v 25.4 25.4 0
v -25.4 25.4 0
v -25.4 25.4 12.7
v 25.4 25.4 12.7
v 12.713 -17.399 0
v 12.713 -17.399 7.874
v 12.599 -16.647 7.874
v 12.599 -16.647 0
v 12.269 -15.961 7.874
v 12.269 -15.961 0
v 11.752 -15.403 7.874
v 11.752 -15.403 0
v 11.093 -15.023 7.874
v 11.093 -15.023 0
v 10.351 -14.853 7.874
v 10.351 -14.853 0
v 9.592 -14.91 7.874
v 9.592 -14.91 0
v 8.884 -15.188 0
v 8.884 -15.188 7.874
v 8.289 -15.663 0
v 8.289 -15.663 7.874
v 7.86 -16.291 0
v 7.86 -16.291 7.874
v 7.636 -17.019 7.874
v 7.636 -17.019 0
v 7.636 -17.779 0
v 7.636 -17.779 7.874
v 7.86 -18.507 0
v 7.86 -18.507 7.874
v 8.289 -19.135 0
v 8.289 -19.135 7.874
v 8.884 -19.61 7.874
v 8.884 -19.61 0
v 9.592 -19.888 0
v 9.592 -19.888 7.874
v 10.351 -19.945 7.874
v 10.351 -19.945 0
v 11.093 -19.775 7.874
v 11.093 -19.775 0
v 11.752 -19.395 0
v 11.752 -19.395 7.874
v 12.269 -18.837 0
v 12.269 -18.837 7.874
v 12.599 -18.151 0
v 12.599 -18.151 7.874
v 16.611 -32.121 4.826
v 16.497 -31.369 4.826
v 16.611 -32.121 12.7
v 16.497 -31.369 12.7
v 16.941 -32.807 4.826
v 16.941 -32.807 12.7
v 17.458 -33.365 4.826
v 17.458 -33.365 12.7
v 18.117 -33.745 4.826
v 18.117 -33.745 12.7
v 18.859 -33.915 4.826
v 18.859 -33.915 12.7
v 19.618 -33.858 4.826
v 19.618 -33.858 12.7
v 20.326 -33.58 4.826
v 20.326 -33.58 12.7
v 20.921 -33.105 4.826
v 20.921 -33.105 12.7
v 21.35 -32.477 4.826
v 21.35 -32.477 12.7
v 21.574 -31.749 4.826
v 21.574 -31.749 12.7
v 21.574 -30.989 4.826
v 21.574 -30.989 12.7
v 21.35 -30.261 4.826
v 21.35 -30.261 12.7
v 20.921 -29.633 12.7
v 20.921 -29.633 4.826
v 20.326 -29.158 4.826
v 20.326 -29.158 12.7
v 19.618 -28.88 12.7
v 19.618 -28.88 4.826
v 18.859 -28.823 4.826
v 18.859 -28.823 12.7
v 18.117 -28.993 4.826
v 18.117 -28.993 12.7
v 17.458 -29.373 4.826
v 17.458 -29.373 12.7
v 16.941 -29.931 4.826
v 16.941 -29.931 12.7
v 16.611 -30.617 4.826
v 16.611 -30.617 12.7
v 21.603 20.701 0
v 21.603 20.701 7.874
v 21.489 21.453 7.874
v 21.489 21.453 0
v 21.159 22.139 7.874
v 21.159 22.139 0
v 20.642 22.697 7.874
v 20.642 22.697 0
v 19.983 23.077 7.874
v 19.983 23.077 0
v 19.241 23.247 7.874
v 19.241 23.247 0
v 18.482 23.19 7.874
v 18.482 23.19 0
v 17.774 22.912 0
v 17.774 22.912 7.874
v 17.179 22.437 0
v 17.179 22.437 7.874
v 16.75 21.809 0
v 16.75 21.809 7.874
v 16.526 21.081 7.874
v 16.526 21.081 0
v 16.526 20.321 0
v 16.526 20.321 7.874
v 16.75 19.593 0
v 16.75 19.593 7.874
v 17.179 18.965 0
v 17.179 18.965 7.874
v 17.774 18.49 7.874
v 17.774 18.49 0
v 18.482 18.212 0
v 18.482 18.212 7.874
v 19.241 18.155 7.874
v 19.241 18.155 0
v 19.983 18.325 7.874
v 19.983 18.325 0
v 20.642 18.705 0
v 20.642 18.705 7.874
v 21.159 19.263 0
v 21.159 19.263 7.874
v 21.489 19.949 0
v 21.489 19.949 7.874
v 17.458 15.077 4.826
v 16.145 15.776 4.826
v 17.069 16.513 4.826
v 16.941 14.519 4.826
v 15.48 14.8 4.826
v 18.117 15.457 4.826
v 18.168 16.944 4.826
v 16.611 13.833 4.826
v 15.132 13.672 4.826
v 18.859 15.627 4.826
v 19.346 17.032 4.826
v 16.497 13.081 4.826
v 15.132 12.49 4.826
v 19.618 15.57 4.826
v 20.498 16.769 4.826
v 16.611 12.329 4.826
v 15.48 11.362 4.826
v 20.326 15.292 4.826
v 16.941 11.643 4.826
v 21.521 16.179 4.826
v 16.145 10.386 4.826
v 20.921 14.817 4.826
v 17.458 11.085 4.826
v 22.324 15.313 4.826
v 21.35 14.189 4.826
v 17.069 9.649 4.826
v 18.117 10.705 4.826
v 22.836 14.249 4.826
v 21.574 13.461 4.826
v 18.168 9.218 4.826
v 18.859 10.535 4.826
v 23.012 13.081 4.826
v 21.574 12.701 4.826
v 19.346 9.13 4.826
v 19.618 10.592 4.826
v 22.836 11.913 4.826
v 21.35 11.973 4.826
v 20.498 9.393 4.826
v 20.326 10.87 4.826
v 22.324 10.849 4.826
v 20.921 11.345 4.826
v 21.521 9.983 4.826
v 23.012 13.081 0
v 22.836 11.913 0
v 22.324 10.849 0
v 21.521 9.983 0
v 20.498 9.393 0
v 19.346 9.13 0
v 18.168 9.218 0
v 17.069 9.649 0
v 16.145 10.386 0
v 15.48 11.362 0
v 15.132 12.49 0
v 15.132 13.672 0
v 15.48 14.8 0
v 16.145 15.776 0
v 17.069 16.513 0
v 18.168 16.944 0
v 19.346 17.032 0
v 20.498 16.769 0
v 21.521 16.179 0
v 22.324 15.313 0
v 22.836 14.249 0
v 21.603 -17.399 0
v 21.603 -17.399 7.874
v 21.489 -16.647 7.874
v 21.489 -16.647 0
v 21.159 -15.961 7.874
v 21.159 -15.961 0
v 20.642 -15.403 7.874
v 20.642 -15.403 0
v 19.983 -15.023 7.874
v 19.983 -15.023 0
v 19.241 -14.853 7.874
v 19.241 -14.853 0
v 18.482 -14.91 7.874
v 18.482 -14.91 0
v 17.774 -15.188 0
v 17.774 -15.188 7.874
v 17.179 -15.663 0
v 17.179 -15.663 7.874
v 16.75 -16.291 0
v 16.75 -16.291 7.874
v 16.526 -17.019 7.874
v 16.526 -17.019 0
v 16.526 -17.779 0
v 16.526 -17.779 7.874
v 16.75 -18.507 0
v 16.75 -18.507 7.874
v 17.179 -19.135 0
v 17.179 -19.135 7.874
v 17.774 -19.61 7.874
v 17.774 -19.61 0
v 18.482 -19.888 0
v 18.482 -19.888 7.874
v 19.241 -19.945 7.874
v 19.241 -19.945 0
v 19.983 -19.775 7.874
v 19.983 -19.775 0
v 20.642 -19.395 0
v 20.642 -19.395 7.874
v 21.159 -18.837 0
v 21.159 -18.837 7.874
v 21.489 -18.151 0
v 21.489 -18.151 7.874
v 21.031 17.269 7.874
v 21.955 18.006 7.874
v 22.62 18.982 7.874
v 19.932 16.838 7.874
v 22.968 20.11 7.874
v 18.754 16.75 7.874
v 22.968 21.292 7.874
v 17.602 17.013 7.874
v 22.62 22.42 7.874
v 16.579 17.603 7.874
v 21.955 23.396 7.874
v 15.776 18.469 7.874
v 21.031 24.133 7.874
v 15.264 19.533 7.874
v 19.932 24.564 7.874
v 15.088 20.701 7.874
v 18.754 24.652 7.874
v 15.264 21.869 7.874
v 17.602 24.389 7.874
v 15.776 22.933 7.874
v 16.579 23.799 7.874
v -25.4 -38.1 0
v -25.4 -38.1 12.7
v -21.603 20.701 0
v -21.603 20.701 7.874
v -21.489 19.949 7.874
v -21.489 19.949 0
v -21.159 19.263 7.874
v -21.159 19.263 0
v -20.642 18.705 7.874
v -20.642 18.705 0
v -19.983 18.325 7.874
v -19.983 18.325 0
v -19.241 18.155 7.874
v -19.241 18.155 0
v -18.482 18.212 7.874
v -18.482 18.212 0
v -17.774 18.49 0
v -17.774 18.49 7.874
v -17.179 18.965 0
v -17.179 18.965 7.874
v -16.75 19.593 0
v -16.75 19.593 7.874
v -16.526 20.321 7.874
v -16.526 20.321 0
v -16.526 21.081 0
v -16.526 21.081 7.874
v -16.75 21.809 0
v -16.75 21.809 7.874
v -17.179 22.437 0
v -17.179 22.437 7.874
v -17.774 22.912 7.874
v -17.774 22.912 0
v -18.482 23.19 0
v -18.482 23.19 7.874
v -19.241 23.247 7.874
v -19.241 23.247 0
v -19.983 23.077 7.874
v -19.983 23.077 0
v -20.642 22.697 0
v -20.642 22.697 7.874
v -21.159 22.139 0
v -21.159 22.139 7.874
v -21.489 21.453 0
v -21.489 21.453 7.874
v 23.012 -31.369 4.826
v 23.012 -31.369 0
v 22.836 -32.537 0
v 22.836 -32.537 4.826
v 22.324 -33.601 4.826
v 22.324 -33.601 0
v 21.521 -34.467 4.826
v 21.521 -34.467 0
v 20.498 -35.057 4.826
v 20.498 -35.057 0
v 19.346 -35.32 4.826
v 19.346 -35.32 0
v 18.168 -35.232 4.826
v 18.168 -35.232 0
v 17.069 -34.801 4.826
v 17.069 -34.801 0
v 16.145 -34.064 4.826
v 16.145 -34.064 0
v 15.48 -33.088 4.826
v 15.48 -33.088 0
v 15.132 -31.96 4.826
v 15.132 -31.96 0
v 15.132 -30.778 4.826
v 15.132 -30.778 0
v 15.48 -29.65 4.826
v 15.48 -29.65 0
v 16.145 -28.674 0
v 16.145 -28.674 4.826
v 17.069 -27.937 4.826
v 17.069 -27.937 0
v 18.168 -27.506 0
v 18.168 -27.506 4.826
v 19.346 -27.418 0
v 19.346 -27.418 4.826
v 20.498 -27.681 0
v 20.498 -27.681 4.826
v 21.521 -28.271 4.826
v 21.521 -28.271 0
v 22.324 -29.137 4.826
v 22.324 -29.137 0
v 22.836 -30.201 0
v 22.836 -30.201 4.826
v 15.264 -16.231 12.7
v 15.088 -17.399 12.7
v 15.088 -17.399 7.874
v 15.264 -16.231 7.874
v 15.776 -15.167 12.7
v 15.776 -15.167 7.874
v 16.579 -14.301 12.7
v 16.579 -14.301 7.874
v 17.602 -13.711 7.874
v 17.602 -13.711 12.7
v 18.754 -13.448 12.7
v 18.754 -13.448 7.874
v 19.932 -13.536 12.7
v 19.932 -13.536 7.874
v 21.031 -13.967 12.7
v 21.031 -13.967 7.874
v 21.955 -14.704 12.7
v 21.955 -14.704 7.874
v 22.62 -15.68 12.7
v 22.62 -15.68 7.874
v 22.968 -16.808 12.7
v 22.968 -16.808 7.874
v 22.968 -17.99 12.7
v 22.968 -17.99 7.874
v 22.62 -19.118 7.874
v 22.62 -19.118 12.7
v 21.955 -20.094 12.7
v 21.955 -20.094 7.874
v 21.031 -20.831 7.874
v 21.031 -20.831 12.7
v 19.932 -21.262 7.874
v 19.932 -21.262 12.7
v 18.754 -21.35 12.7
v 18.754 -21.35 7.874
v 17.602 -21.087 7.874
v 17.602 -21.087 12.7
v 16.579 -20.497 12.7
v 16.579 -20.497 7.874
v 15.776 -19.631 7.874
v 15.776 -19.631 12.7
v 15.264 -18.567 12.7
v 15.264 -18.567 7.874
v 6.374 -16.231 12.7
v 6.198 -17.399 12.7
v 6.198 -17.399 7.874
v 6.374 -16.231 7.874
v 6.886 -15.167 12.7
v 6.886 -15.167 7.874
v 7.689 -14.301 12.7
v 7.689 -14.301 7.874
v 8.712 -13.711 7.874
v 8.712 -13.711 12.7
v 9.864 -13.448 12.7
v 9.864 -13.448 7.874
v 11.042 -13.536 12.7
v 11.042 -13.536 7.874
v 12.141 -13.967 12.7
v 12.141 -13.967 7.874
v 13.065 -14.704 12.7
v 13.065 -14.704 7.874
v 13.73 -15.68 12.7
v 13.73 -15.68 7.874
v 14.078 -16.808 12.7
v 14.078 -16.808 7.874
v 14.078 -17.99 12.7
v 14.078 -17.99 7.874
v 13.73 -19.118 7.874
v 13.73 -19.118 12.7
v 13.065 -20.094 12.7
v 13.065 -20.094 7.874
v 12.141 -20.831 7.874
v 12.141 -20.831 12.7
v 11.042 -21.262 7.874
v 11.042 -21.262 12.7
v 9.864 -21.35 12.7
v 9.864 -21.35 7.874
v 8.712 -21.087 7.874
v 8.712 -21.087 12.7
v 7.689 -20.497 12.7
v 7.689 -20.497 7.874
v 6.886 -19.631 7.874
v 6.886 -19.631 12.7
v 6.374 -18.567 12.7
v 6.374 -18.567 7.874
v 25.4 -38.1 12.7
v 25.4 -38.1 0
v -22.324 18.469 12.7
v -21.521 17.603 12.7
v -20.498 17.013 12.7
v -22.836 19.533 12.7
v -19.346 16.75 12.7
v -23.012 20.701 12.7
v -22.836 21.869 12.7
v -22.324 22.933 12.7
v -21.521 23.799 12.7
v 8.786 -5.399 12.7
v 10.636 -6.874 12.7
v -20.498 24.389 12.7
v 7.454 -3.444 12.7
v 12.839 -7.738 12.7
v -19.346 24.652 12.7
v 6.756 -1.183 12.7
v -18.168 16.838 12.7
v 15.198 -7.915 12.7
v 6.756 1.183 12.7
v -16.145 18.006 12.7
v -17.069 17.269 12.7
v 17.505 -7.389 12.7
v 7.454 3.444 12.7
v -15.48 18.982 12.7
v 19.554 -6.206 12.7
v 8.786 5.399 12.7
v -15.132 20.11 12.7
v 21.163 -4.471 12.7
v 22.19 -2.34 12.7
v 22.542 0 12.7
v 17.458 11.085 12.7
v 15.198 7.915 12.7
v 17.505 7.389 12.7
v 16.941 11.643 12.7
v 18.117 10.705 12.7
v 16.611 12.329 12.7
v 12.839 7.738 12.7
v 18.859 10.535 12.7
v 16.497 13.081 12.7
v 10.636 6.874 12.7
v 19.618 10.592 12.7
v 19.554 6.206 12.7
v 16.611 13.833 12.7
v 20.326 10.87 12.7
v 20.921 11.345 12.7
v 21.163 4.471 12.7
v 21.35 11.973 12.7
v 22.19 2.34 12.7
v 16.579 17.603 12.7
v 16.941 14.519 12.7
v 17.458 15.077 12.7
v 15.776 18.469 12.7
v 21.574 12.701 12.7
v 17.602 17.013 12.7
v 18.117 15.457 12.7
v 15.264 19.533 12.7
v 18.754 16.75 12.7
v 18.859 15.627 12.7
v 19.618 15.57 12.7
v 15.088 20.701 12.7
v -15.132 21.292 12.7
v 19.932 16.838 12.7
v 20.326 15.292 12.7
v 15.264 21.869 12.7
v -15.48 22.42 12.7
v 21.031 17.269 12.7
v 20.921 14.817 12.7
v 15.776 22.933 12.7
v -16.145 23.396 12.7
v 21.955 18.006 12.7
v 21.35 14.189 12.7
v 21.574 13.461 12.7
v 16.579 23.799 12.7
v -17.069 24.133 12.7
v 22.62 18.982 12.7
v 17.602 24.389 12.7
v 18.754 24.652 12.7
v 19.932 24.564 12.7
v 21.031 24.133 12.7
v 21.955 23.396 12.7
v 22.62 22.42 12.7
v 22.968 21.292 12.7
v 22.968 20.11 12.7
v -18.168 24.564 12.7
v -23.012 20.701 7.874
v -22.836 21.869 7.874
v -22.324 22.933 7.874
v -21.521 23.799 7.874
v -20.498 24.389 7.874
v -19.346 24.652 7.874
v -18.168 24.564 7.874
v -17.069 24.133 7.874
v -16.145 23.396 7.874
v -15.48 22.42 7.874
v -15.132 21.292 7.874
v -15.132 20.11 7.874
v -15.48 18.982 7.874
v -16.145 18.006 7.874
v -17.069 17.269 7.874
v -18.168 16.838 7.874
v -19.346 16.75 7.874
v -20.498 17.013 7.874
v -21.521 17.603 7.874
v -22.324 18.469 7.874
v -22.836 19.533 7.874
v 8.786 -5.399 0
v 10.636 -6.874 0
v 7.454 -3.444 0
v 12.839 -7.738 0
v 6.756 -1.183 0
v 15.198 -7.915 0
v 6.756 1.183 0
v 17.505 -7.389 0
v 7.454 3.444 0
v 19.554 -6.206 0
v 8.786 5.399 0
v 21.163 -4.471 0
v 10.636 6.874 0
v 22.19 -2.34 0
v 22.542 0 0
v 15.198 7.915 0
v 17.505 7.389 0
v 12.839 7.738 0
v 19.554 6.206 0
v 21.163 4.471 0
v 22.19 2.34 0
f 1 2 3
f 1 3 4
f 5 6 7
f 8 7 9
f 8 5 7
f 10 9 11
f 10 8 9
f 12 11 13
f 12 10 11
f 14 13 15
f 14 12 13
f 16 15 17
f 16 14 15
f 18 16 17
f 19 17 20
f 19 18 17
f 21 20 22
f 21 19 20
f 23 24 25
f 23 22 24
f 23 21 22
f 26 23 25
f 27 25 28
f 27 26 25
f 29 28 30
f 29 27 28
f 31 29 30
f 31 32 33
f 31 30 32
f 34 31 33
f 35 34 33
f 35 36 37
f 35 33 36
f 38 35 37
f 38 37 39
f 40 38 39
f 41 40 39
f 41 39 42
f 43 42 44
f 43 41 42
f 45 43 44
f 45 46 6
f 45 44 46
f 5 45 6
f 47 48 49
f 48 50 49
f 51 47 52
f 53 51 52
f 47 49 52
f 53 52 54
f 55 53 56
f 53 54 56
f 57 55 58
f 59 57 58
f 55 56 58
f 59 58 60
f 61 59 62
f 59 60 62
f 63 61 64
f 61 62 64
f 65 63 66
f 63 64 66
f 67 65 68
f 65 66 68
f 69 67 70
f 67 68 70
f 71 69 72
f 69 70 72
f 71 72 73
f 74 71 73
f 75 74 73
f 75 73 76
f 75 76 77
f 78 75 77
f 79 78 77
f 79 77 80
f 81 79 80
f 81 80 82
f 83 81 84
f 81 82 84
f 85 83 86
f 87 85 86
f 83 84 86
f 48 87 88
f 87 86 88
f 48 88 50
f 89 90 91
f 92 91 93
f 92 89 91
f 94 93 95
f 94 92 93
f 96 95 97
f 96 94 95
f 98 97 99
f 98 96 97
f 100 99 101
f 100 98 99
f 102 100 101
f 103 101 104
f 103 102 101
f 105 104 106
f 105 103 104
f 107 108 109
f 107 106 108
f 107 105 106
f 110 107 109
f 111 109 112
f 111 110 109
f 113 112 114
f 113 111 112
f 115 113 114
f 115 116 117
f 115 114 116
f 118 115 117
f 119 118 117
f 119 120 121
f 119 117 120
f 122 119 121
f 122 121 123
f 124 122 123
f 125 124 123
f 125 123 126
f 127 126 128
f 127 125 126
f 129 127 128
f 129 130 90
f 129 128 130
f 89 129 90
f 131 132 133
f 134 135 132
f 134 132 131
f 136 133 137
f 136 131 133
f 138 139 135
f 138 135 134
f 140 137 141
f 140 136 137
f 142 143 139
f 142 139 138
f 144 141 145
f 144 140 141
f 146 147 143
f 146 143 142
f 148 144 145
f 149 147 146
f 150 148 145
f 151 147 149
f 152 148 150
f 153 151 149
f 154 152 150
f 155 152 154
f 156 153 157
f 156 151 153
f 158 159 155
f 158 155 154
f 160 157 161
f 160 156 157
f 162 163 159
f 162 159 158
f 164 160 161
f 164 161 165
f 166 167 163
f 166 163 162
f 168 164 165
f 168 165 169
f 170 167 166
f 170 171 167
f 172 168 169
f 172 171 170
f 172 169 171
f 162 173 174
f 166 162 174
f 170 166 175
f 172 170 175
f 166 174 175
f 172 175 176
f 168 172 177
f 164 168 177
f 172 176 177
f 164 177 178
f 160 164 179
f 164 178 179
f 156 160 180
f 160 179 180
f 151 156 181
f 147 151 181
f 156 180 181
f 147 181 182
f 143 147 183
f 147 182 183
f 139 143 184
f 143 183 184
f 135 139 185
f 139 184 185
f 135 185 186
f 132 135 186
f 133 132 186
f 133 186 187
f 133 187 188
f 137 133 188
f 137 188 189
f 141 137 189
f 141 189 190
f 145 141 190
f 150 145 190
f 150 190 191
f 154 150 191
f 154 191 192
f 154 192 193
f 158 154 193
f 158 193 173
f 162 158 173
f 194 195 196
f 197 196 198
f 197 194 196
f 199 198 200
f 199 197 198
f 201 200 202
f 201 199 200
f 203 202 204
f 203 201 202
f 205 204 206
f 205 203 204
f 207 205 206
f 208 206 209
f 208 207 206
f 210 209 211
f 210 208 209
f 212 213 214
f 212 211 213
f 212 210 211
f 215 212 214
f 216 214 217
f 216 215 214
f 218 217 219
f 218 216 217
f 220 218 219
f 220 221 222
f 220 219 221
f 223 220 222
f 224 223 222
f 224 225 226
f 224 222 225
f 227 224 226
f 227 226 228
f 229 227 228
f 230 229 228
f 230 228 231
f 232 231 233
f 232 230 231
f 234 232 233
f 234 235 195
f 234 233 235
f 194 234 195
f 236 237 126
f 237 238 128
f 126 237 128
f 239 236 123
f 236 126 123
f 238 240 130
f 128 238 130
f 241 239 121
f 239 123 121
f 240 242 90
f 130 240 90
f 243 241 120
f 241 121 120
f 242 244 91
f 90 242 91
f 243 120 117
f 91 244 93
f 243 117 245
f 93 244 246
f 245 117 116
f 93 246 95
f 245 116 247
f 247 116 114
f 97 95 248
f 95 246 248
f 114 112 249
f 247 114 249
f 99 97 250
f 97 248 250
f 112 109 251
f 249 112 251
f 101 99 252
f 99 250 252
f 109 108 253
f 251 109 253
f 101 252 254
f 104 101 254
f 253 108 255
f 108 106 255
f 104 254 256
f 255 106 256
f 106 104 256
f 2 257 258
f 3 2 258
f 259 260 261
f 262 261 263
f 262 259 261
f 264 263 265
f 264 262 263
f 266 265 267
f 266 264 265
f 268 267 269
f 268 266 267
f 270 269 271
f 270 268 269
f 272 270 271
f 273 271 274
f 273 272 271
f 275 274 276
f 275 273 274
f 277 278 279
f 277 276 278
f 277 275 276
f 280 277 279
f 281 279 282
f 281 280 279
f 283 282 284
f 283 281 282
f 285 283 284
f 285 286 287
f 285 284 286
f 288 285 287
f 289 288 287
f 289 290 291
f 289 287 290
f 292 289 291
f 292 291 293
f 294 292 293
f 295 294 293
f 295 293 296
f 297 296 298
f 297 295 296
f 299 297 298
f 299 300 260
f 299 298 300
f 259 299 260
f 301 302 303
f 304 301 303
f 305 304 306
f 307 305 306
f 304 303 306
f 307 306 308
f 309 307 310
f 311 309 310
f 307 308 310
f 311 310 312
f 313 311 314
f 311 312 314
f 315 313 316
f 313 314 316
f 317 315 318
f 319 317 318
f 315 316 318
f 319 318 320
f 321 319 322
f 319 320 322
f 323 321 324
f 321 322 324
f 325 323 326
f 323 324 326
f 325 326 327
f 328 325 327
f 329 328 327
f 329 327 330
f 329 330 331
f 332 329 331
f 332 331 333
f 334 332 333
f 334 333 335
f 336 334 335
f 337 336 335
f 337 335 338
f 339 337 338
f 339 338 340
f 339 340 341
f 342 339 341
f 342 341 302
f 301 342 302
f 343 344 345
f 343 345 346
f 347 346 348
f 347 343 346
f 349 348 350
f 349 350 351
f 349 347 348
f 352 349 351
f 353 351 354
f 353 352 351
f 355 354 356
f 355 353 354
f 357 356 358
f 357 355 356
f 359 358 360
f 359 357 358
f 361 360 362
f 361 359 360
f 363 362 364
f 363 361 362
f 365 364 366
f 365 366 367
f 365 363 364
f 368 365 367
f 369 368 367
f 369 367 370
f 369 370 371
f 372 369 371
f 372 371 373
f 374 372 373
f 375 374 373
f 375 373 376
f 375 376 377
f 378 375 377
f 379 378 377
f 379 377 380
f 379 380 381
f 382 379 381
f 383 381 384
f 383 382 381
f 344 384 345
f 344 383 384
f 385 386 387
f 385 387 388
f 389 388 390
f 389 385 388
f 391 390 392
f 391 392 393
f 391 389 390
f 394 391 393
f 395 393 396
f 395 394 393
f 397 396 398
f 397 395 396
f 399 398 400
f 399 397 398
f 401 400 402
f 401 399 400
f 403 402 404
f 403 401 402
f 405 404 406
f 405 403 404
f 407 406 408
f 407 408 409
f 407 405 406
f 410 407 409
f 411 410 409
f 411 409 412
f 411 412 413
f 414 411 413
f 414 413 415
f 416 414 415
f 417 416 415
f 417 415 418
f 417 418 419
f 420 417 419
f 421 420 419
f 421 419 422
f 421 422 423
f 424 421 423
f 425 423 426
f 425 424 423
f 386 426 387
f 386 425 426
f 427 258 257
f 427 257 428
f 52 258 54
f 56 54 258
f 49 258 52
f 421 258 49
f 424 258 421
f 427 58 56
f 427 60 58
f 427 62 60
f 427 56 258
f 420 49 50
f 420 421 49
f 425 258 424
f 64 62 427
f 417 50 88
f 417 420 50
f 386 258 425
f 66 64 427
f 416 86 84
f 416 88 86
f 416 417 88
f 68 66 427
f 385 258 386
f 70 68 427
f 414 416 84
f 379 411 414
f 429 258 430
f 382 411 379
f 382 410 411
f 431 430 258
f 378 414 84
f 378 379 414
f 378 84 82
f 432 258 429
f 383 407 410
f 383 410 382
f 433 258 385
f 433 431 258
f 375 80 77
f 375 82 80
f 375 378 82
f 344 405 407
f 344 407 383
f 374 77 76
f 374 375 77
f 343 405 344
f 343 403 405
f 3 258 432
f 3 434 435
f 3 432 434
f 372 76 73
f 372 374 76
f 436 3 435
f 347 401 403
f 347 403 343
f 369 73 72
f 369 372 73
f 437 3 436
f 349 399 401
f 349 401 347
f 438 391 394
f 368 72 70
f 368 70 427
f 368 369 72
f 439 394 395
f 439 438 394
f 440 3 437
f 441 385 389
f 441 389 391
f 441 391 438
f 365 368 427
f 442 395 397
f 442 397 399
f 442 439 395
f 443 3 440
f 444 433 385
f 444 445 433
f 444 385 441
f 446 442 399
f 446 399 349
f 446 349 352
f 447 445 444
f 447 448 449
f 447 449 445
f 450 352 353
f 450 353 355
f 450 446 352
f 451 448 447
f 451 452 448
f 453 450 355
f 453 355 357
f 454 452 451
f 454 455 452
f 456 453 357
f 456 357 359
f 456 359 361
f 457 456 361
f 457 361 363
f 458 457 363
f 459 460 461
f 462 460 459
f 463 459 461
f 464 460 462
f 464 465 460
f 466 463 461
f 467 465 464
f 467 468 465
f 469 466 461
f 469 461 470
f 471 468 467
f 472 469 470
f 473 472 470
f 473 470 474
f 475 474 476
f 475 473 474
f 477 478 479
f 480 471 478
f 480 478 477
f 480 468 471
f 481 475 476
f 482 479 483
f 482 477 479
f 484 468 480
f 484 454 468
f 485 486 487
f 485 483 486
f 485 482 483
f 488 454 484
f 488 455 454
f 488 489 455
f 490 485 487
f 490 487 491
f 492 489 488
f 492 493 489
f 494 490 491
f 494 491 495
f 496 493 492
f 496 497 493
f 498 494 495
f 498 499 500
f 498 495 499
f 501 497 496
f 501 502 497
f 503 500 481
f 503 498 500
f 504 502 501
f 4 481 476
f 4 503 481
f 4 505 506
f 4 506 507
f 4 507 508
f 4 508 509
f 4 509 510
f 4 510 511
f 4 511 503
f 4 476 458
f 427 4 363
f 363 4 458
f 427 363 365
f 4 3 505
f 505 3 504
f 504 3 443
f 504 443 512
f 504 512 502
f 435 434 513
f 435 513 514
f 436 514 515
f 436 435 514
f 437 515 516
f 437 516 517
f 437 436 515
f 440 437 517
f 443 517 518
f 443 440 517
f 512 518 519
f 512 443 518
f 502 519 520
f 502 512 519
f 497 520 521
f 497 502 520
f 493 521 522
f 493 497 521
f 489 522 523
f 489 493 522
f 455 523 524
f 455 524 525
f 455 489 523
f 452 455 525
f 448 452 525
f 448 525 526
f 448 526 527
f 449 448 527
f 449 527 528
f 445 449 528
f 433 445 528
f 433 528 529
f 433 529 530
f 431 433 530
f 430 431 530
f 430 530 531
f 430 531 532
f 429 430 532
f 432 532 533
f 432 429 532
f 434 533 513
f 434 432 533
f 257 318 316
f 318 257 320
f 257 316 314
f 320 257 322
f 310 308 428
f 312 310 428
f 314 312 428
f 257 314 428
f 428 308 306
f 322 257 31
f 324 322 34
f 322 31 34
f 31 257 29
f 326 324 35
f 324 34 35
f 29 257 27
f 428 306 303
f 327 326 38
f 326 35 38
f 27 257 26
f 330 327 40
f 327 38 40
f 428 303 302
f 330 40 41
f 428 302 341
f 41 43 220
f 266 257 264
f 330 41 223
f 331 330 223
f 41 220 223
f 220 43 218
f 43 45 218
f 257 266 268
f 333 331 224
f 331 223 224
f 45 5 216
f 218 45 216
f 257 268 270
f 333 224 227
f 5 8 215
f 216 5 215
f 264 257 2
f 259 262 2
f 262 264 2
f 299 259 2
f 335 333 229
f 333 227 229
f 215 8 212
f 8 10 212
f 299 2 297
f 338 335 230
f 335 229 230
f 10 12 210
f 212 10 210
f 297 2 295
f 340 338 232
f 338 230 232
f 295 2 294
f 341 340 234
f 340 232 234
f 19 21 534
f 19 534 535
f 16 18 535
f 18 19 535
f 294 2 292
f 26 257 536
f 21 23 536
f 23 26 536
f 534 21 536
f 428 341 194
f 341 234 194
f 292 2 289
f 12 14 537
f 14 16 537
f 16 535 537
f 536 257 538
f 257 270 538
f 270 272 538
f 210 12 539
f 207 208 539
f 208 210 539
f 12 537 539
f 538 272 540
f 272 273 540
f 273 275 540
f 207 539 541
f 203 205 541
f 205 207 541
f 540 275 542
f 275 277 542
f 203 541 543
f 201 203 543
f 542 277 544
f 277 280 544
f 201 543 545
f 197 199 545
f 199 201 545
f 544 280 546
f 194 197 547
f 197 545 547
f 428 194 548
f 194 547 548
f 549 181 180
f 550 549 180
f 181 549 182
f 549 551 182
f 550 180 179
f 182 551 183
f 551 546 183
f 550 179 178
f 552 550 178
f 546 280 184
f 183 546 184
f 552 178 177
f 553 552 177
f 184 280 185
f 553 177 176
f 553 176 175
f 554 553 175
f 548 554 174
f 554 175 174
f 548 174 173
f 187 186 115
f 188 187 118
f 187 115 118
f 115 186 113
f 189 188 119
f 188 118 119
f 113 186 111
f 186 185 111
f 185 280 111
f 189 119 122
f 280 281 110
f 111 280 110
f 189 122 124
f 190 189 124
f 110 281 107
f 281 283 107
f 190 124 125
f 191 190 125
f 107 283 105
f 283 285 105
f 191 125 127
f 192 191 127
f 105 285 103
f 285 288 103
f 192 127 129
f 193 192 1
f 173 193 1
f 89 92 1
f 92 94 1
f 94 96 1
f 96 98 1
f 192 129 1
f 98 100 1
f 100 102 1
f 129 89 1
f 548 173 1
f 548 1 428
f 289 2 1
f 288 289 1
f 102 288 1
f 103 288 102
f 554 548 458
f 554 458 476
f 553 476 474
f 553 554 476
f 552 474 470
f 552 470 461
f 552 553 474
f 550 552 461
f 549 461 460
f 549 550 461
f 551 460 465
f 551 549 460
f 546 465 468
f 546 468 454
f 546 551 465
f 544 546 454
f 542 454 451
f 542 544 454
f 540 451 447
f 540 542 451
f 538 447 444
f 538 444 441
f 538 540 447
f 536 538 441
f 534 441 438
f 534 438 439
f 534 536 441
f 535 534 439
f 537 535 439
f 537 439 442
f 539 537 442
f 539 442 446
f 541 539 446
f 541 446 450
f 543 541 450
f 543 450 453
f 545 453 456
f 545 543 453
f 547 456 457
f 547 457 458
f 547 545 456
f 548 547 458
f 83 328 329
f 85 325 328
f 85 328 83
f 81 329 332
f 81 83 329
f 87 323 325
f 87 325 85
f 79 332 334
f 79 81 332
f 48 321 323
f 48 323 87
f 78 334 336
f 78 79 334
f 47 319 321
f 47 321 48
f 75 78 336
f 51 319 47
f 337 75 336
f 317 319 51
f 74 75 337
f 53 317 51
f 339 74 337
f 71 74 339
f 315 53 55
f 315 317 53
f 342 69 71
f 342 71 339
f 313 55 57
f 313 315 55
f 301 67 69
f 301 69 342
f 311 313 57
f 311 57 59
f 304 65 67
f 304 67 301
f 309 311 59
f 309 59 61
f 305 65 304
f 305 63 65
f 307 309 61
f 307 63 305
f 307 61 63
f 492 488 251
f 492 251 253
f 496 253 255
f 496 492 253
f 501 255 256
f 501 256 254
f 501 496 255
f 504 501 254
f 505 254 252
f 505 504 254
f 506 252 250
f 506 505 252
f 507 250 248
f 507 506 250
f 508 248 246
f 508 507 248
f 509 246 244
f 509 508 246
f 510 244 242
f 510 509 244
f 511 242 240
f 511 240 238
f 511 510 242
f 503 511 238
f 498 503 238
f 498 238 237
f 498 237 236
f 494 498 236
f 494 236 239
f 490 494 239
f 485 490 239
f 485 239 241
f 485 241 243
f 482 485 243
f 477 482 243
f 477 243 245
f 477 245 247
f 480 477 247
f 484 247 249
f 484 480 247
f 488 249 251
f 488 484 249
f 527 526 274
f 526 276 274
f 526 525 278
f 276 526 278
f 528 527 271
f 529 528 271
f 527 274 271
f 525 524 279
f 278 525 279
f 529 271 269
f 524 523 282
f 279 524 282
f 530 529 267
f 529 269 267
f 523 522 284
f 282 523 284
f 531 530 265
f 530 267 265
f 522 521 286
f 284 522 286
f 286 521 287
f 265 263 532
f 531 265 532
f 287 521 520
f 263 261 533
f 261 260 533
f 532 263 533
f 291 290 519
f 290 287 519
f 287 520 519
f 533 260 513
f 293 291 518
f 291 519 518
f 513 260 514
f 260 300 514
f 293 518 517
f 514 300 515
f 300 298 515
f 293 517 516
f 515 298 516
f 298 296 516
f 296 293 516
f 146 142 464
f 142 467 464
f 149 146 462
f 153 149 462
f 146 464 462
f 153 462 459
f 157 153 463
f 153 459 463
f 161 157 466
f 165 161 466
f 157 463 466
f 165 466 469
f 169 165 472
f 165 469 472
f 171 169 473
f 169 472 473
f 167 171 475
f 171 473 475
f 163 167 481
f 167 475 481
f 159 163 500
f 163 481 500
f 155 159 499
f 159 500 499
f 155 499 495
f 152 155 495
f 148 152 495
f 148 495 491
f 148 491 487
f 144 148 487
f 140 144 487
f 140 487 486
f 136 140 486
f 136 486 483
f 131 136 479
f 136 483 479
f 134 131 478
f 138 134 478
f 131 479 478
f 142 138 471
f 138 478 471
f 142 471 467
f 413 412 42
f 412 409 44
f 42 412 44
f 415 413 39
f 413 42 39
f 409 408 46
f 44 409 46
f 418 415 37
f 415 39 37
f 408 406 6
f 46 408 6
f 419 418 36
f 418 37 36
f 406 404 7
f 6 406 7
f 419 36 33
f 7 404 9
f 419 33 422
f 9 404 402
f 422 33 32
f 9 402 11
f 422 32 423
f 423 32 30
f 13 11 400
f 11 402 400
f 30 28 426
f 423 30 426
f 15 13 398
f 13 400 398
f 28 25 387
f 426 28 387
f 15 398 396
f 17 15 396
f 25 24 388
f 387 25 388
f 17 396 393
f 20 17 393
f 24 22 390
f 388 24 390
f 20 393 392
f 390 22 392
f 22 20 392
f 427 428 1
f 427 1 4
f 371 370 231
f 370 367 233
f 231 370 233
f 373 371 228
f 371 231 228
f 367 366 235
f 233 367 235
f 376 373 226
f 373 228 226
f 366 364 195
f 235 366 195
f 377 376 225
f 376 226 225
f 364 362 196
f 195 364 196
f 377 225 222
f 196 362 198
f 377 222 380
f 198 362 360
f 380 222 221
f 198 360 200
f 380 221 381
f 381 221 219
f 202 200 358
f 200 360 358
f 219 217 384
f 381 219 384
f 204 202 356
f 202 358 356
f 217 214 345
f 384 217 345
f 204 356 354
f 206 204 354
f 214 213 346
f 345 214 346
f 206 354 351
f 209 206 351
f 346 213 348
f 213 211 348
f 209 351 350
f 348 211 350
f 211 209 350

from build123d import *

# Parameters (mm, degrees)
SKETCH1_W                                       = 50.8
SKETCH1_H                                       = 50.8
SKETCH1_R                                       = 2.5527
SKETCH1_R_2                                     = 7.9375
BOSS_EXTRUDE1_DEPTH                             = 12.7
SKETCH2_W                                       = 50.8
SKETCH2_H                                       = 12.7
BOSS_EXTRUDE2_DEPTH                             = 12.7
CBORE_FOR_10_SOCKET_HEAD_CAP_SCREW1_D           = 5.1054
CBORE_FOR_10_SOCKET_HEAD_CAP_SCREW1_CBORE_D     = 7.9248
CBORE_FOR_10_SOCKET_HEAD_CAP_SCREW1_CBORE_DEPTH = 4.826
SKETCH6_R                                       = 3.9624
CUT_EXTRUDE1_DEPTH                              = 4.826


with BuildPart() as part:
    # Sketch1 → Boss-Extrude1 (new body)
    with BuildSketch(Plane.XY):
        Rectangle(SKETCH1_W, SKETCH1_H)
        with Locations(Location((-19.05, 20.701, 0), (0, 0, 180))):
            Circle(SKETCH1_R, mode=Mode.SUBTRACT)
        with Locations((19.05, 20.701)):
            Circle(SKETCH1_R, mode=Mode.SUBTRACT)
        with Locations((19.05, -17.399)):
            Circle(SKETCH1_R, mode=Mode.SUBTRACT)
        with Locations((10.16, -17.399)):
            Circle(SKETCH1_R, mode=Mode.SUBTRACT)
        with Locations((14.605, 0)):
            Circle(SKETCH1_R_2, mode=Mode.SUBTRACT)
    extrude(amount=BOSS_EXTRUDE1_DEPTH)

    # Sketch2 → Boss-Extrude2 (add)
    with BuildSketch(Plane.XZ.offset(25.4)):
        with Locations((0, 6.35)):
            Rectangle(SKETCH2_W, SKETCH2_H)
    extrude(amount=BOSS_EXTRUDE2_DEPTH)

    # CBORE for #10 Socket Head Cap Screw1 (through all)
    with Locations(Plane(origin=(-24.721209515, -12.864288698, 0), x_dir=(1, 0, 0), z_dir=(0, 0, -1))):
        with Locations((43.771209515, 18.504711302), (43.771209515, -25.945288698)):
            CounterBoreHole(CBORE_FOR_10_SOCKET_HEAD_CAP_SCREW1_D / 2, CBORE_FOR_10_SOCKET_HEAD_CAP_SCREW1_CBORE_D / 2, CBORE_FOR_10_SOCKET_HEAD_CAP_SCREW1_CBORE_DEPTH)

    # Sketch6 → Cut-Extrude1 (cut)
    with BuildSketch(Plane(origin=(0, 0, 12.7), x_dir=(-1, 0, 0), z_dir=(0, 0, -1))):
        with Locations((-19.05, 20.701)):
            Circle(SKETCH6_R)
        with Locations((-19.05, -17.399)):
            Circle(SKETCH6_R)
        with Locations((-10.16, -17.399)):
            Circle(SKETCH6_R)
        with Locations((19.05, 20.701)):
            Circle(SKETCH6_R)
    extrude(amount=CUT_EXTRUDE1_DEPTH, mode=Mode.SUBTRACT)


solid = part.part
